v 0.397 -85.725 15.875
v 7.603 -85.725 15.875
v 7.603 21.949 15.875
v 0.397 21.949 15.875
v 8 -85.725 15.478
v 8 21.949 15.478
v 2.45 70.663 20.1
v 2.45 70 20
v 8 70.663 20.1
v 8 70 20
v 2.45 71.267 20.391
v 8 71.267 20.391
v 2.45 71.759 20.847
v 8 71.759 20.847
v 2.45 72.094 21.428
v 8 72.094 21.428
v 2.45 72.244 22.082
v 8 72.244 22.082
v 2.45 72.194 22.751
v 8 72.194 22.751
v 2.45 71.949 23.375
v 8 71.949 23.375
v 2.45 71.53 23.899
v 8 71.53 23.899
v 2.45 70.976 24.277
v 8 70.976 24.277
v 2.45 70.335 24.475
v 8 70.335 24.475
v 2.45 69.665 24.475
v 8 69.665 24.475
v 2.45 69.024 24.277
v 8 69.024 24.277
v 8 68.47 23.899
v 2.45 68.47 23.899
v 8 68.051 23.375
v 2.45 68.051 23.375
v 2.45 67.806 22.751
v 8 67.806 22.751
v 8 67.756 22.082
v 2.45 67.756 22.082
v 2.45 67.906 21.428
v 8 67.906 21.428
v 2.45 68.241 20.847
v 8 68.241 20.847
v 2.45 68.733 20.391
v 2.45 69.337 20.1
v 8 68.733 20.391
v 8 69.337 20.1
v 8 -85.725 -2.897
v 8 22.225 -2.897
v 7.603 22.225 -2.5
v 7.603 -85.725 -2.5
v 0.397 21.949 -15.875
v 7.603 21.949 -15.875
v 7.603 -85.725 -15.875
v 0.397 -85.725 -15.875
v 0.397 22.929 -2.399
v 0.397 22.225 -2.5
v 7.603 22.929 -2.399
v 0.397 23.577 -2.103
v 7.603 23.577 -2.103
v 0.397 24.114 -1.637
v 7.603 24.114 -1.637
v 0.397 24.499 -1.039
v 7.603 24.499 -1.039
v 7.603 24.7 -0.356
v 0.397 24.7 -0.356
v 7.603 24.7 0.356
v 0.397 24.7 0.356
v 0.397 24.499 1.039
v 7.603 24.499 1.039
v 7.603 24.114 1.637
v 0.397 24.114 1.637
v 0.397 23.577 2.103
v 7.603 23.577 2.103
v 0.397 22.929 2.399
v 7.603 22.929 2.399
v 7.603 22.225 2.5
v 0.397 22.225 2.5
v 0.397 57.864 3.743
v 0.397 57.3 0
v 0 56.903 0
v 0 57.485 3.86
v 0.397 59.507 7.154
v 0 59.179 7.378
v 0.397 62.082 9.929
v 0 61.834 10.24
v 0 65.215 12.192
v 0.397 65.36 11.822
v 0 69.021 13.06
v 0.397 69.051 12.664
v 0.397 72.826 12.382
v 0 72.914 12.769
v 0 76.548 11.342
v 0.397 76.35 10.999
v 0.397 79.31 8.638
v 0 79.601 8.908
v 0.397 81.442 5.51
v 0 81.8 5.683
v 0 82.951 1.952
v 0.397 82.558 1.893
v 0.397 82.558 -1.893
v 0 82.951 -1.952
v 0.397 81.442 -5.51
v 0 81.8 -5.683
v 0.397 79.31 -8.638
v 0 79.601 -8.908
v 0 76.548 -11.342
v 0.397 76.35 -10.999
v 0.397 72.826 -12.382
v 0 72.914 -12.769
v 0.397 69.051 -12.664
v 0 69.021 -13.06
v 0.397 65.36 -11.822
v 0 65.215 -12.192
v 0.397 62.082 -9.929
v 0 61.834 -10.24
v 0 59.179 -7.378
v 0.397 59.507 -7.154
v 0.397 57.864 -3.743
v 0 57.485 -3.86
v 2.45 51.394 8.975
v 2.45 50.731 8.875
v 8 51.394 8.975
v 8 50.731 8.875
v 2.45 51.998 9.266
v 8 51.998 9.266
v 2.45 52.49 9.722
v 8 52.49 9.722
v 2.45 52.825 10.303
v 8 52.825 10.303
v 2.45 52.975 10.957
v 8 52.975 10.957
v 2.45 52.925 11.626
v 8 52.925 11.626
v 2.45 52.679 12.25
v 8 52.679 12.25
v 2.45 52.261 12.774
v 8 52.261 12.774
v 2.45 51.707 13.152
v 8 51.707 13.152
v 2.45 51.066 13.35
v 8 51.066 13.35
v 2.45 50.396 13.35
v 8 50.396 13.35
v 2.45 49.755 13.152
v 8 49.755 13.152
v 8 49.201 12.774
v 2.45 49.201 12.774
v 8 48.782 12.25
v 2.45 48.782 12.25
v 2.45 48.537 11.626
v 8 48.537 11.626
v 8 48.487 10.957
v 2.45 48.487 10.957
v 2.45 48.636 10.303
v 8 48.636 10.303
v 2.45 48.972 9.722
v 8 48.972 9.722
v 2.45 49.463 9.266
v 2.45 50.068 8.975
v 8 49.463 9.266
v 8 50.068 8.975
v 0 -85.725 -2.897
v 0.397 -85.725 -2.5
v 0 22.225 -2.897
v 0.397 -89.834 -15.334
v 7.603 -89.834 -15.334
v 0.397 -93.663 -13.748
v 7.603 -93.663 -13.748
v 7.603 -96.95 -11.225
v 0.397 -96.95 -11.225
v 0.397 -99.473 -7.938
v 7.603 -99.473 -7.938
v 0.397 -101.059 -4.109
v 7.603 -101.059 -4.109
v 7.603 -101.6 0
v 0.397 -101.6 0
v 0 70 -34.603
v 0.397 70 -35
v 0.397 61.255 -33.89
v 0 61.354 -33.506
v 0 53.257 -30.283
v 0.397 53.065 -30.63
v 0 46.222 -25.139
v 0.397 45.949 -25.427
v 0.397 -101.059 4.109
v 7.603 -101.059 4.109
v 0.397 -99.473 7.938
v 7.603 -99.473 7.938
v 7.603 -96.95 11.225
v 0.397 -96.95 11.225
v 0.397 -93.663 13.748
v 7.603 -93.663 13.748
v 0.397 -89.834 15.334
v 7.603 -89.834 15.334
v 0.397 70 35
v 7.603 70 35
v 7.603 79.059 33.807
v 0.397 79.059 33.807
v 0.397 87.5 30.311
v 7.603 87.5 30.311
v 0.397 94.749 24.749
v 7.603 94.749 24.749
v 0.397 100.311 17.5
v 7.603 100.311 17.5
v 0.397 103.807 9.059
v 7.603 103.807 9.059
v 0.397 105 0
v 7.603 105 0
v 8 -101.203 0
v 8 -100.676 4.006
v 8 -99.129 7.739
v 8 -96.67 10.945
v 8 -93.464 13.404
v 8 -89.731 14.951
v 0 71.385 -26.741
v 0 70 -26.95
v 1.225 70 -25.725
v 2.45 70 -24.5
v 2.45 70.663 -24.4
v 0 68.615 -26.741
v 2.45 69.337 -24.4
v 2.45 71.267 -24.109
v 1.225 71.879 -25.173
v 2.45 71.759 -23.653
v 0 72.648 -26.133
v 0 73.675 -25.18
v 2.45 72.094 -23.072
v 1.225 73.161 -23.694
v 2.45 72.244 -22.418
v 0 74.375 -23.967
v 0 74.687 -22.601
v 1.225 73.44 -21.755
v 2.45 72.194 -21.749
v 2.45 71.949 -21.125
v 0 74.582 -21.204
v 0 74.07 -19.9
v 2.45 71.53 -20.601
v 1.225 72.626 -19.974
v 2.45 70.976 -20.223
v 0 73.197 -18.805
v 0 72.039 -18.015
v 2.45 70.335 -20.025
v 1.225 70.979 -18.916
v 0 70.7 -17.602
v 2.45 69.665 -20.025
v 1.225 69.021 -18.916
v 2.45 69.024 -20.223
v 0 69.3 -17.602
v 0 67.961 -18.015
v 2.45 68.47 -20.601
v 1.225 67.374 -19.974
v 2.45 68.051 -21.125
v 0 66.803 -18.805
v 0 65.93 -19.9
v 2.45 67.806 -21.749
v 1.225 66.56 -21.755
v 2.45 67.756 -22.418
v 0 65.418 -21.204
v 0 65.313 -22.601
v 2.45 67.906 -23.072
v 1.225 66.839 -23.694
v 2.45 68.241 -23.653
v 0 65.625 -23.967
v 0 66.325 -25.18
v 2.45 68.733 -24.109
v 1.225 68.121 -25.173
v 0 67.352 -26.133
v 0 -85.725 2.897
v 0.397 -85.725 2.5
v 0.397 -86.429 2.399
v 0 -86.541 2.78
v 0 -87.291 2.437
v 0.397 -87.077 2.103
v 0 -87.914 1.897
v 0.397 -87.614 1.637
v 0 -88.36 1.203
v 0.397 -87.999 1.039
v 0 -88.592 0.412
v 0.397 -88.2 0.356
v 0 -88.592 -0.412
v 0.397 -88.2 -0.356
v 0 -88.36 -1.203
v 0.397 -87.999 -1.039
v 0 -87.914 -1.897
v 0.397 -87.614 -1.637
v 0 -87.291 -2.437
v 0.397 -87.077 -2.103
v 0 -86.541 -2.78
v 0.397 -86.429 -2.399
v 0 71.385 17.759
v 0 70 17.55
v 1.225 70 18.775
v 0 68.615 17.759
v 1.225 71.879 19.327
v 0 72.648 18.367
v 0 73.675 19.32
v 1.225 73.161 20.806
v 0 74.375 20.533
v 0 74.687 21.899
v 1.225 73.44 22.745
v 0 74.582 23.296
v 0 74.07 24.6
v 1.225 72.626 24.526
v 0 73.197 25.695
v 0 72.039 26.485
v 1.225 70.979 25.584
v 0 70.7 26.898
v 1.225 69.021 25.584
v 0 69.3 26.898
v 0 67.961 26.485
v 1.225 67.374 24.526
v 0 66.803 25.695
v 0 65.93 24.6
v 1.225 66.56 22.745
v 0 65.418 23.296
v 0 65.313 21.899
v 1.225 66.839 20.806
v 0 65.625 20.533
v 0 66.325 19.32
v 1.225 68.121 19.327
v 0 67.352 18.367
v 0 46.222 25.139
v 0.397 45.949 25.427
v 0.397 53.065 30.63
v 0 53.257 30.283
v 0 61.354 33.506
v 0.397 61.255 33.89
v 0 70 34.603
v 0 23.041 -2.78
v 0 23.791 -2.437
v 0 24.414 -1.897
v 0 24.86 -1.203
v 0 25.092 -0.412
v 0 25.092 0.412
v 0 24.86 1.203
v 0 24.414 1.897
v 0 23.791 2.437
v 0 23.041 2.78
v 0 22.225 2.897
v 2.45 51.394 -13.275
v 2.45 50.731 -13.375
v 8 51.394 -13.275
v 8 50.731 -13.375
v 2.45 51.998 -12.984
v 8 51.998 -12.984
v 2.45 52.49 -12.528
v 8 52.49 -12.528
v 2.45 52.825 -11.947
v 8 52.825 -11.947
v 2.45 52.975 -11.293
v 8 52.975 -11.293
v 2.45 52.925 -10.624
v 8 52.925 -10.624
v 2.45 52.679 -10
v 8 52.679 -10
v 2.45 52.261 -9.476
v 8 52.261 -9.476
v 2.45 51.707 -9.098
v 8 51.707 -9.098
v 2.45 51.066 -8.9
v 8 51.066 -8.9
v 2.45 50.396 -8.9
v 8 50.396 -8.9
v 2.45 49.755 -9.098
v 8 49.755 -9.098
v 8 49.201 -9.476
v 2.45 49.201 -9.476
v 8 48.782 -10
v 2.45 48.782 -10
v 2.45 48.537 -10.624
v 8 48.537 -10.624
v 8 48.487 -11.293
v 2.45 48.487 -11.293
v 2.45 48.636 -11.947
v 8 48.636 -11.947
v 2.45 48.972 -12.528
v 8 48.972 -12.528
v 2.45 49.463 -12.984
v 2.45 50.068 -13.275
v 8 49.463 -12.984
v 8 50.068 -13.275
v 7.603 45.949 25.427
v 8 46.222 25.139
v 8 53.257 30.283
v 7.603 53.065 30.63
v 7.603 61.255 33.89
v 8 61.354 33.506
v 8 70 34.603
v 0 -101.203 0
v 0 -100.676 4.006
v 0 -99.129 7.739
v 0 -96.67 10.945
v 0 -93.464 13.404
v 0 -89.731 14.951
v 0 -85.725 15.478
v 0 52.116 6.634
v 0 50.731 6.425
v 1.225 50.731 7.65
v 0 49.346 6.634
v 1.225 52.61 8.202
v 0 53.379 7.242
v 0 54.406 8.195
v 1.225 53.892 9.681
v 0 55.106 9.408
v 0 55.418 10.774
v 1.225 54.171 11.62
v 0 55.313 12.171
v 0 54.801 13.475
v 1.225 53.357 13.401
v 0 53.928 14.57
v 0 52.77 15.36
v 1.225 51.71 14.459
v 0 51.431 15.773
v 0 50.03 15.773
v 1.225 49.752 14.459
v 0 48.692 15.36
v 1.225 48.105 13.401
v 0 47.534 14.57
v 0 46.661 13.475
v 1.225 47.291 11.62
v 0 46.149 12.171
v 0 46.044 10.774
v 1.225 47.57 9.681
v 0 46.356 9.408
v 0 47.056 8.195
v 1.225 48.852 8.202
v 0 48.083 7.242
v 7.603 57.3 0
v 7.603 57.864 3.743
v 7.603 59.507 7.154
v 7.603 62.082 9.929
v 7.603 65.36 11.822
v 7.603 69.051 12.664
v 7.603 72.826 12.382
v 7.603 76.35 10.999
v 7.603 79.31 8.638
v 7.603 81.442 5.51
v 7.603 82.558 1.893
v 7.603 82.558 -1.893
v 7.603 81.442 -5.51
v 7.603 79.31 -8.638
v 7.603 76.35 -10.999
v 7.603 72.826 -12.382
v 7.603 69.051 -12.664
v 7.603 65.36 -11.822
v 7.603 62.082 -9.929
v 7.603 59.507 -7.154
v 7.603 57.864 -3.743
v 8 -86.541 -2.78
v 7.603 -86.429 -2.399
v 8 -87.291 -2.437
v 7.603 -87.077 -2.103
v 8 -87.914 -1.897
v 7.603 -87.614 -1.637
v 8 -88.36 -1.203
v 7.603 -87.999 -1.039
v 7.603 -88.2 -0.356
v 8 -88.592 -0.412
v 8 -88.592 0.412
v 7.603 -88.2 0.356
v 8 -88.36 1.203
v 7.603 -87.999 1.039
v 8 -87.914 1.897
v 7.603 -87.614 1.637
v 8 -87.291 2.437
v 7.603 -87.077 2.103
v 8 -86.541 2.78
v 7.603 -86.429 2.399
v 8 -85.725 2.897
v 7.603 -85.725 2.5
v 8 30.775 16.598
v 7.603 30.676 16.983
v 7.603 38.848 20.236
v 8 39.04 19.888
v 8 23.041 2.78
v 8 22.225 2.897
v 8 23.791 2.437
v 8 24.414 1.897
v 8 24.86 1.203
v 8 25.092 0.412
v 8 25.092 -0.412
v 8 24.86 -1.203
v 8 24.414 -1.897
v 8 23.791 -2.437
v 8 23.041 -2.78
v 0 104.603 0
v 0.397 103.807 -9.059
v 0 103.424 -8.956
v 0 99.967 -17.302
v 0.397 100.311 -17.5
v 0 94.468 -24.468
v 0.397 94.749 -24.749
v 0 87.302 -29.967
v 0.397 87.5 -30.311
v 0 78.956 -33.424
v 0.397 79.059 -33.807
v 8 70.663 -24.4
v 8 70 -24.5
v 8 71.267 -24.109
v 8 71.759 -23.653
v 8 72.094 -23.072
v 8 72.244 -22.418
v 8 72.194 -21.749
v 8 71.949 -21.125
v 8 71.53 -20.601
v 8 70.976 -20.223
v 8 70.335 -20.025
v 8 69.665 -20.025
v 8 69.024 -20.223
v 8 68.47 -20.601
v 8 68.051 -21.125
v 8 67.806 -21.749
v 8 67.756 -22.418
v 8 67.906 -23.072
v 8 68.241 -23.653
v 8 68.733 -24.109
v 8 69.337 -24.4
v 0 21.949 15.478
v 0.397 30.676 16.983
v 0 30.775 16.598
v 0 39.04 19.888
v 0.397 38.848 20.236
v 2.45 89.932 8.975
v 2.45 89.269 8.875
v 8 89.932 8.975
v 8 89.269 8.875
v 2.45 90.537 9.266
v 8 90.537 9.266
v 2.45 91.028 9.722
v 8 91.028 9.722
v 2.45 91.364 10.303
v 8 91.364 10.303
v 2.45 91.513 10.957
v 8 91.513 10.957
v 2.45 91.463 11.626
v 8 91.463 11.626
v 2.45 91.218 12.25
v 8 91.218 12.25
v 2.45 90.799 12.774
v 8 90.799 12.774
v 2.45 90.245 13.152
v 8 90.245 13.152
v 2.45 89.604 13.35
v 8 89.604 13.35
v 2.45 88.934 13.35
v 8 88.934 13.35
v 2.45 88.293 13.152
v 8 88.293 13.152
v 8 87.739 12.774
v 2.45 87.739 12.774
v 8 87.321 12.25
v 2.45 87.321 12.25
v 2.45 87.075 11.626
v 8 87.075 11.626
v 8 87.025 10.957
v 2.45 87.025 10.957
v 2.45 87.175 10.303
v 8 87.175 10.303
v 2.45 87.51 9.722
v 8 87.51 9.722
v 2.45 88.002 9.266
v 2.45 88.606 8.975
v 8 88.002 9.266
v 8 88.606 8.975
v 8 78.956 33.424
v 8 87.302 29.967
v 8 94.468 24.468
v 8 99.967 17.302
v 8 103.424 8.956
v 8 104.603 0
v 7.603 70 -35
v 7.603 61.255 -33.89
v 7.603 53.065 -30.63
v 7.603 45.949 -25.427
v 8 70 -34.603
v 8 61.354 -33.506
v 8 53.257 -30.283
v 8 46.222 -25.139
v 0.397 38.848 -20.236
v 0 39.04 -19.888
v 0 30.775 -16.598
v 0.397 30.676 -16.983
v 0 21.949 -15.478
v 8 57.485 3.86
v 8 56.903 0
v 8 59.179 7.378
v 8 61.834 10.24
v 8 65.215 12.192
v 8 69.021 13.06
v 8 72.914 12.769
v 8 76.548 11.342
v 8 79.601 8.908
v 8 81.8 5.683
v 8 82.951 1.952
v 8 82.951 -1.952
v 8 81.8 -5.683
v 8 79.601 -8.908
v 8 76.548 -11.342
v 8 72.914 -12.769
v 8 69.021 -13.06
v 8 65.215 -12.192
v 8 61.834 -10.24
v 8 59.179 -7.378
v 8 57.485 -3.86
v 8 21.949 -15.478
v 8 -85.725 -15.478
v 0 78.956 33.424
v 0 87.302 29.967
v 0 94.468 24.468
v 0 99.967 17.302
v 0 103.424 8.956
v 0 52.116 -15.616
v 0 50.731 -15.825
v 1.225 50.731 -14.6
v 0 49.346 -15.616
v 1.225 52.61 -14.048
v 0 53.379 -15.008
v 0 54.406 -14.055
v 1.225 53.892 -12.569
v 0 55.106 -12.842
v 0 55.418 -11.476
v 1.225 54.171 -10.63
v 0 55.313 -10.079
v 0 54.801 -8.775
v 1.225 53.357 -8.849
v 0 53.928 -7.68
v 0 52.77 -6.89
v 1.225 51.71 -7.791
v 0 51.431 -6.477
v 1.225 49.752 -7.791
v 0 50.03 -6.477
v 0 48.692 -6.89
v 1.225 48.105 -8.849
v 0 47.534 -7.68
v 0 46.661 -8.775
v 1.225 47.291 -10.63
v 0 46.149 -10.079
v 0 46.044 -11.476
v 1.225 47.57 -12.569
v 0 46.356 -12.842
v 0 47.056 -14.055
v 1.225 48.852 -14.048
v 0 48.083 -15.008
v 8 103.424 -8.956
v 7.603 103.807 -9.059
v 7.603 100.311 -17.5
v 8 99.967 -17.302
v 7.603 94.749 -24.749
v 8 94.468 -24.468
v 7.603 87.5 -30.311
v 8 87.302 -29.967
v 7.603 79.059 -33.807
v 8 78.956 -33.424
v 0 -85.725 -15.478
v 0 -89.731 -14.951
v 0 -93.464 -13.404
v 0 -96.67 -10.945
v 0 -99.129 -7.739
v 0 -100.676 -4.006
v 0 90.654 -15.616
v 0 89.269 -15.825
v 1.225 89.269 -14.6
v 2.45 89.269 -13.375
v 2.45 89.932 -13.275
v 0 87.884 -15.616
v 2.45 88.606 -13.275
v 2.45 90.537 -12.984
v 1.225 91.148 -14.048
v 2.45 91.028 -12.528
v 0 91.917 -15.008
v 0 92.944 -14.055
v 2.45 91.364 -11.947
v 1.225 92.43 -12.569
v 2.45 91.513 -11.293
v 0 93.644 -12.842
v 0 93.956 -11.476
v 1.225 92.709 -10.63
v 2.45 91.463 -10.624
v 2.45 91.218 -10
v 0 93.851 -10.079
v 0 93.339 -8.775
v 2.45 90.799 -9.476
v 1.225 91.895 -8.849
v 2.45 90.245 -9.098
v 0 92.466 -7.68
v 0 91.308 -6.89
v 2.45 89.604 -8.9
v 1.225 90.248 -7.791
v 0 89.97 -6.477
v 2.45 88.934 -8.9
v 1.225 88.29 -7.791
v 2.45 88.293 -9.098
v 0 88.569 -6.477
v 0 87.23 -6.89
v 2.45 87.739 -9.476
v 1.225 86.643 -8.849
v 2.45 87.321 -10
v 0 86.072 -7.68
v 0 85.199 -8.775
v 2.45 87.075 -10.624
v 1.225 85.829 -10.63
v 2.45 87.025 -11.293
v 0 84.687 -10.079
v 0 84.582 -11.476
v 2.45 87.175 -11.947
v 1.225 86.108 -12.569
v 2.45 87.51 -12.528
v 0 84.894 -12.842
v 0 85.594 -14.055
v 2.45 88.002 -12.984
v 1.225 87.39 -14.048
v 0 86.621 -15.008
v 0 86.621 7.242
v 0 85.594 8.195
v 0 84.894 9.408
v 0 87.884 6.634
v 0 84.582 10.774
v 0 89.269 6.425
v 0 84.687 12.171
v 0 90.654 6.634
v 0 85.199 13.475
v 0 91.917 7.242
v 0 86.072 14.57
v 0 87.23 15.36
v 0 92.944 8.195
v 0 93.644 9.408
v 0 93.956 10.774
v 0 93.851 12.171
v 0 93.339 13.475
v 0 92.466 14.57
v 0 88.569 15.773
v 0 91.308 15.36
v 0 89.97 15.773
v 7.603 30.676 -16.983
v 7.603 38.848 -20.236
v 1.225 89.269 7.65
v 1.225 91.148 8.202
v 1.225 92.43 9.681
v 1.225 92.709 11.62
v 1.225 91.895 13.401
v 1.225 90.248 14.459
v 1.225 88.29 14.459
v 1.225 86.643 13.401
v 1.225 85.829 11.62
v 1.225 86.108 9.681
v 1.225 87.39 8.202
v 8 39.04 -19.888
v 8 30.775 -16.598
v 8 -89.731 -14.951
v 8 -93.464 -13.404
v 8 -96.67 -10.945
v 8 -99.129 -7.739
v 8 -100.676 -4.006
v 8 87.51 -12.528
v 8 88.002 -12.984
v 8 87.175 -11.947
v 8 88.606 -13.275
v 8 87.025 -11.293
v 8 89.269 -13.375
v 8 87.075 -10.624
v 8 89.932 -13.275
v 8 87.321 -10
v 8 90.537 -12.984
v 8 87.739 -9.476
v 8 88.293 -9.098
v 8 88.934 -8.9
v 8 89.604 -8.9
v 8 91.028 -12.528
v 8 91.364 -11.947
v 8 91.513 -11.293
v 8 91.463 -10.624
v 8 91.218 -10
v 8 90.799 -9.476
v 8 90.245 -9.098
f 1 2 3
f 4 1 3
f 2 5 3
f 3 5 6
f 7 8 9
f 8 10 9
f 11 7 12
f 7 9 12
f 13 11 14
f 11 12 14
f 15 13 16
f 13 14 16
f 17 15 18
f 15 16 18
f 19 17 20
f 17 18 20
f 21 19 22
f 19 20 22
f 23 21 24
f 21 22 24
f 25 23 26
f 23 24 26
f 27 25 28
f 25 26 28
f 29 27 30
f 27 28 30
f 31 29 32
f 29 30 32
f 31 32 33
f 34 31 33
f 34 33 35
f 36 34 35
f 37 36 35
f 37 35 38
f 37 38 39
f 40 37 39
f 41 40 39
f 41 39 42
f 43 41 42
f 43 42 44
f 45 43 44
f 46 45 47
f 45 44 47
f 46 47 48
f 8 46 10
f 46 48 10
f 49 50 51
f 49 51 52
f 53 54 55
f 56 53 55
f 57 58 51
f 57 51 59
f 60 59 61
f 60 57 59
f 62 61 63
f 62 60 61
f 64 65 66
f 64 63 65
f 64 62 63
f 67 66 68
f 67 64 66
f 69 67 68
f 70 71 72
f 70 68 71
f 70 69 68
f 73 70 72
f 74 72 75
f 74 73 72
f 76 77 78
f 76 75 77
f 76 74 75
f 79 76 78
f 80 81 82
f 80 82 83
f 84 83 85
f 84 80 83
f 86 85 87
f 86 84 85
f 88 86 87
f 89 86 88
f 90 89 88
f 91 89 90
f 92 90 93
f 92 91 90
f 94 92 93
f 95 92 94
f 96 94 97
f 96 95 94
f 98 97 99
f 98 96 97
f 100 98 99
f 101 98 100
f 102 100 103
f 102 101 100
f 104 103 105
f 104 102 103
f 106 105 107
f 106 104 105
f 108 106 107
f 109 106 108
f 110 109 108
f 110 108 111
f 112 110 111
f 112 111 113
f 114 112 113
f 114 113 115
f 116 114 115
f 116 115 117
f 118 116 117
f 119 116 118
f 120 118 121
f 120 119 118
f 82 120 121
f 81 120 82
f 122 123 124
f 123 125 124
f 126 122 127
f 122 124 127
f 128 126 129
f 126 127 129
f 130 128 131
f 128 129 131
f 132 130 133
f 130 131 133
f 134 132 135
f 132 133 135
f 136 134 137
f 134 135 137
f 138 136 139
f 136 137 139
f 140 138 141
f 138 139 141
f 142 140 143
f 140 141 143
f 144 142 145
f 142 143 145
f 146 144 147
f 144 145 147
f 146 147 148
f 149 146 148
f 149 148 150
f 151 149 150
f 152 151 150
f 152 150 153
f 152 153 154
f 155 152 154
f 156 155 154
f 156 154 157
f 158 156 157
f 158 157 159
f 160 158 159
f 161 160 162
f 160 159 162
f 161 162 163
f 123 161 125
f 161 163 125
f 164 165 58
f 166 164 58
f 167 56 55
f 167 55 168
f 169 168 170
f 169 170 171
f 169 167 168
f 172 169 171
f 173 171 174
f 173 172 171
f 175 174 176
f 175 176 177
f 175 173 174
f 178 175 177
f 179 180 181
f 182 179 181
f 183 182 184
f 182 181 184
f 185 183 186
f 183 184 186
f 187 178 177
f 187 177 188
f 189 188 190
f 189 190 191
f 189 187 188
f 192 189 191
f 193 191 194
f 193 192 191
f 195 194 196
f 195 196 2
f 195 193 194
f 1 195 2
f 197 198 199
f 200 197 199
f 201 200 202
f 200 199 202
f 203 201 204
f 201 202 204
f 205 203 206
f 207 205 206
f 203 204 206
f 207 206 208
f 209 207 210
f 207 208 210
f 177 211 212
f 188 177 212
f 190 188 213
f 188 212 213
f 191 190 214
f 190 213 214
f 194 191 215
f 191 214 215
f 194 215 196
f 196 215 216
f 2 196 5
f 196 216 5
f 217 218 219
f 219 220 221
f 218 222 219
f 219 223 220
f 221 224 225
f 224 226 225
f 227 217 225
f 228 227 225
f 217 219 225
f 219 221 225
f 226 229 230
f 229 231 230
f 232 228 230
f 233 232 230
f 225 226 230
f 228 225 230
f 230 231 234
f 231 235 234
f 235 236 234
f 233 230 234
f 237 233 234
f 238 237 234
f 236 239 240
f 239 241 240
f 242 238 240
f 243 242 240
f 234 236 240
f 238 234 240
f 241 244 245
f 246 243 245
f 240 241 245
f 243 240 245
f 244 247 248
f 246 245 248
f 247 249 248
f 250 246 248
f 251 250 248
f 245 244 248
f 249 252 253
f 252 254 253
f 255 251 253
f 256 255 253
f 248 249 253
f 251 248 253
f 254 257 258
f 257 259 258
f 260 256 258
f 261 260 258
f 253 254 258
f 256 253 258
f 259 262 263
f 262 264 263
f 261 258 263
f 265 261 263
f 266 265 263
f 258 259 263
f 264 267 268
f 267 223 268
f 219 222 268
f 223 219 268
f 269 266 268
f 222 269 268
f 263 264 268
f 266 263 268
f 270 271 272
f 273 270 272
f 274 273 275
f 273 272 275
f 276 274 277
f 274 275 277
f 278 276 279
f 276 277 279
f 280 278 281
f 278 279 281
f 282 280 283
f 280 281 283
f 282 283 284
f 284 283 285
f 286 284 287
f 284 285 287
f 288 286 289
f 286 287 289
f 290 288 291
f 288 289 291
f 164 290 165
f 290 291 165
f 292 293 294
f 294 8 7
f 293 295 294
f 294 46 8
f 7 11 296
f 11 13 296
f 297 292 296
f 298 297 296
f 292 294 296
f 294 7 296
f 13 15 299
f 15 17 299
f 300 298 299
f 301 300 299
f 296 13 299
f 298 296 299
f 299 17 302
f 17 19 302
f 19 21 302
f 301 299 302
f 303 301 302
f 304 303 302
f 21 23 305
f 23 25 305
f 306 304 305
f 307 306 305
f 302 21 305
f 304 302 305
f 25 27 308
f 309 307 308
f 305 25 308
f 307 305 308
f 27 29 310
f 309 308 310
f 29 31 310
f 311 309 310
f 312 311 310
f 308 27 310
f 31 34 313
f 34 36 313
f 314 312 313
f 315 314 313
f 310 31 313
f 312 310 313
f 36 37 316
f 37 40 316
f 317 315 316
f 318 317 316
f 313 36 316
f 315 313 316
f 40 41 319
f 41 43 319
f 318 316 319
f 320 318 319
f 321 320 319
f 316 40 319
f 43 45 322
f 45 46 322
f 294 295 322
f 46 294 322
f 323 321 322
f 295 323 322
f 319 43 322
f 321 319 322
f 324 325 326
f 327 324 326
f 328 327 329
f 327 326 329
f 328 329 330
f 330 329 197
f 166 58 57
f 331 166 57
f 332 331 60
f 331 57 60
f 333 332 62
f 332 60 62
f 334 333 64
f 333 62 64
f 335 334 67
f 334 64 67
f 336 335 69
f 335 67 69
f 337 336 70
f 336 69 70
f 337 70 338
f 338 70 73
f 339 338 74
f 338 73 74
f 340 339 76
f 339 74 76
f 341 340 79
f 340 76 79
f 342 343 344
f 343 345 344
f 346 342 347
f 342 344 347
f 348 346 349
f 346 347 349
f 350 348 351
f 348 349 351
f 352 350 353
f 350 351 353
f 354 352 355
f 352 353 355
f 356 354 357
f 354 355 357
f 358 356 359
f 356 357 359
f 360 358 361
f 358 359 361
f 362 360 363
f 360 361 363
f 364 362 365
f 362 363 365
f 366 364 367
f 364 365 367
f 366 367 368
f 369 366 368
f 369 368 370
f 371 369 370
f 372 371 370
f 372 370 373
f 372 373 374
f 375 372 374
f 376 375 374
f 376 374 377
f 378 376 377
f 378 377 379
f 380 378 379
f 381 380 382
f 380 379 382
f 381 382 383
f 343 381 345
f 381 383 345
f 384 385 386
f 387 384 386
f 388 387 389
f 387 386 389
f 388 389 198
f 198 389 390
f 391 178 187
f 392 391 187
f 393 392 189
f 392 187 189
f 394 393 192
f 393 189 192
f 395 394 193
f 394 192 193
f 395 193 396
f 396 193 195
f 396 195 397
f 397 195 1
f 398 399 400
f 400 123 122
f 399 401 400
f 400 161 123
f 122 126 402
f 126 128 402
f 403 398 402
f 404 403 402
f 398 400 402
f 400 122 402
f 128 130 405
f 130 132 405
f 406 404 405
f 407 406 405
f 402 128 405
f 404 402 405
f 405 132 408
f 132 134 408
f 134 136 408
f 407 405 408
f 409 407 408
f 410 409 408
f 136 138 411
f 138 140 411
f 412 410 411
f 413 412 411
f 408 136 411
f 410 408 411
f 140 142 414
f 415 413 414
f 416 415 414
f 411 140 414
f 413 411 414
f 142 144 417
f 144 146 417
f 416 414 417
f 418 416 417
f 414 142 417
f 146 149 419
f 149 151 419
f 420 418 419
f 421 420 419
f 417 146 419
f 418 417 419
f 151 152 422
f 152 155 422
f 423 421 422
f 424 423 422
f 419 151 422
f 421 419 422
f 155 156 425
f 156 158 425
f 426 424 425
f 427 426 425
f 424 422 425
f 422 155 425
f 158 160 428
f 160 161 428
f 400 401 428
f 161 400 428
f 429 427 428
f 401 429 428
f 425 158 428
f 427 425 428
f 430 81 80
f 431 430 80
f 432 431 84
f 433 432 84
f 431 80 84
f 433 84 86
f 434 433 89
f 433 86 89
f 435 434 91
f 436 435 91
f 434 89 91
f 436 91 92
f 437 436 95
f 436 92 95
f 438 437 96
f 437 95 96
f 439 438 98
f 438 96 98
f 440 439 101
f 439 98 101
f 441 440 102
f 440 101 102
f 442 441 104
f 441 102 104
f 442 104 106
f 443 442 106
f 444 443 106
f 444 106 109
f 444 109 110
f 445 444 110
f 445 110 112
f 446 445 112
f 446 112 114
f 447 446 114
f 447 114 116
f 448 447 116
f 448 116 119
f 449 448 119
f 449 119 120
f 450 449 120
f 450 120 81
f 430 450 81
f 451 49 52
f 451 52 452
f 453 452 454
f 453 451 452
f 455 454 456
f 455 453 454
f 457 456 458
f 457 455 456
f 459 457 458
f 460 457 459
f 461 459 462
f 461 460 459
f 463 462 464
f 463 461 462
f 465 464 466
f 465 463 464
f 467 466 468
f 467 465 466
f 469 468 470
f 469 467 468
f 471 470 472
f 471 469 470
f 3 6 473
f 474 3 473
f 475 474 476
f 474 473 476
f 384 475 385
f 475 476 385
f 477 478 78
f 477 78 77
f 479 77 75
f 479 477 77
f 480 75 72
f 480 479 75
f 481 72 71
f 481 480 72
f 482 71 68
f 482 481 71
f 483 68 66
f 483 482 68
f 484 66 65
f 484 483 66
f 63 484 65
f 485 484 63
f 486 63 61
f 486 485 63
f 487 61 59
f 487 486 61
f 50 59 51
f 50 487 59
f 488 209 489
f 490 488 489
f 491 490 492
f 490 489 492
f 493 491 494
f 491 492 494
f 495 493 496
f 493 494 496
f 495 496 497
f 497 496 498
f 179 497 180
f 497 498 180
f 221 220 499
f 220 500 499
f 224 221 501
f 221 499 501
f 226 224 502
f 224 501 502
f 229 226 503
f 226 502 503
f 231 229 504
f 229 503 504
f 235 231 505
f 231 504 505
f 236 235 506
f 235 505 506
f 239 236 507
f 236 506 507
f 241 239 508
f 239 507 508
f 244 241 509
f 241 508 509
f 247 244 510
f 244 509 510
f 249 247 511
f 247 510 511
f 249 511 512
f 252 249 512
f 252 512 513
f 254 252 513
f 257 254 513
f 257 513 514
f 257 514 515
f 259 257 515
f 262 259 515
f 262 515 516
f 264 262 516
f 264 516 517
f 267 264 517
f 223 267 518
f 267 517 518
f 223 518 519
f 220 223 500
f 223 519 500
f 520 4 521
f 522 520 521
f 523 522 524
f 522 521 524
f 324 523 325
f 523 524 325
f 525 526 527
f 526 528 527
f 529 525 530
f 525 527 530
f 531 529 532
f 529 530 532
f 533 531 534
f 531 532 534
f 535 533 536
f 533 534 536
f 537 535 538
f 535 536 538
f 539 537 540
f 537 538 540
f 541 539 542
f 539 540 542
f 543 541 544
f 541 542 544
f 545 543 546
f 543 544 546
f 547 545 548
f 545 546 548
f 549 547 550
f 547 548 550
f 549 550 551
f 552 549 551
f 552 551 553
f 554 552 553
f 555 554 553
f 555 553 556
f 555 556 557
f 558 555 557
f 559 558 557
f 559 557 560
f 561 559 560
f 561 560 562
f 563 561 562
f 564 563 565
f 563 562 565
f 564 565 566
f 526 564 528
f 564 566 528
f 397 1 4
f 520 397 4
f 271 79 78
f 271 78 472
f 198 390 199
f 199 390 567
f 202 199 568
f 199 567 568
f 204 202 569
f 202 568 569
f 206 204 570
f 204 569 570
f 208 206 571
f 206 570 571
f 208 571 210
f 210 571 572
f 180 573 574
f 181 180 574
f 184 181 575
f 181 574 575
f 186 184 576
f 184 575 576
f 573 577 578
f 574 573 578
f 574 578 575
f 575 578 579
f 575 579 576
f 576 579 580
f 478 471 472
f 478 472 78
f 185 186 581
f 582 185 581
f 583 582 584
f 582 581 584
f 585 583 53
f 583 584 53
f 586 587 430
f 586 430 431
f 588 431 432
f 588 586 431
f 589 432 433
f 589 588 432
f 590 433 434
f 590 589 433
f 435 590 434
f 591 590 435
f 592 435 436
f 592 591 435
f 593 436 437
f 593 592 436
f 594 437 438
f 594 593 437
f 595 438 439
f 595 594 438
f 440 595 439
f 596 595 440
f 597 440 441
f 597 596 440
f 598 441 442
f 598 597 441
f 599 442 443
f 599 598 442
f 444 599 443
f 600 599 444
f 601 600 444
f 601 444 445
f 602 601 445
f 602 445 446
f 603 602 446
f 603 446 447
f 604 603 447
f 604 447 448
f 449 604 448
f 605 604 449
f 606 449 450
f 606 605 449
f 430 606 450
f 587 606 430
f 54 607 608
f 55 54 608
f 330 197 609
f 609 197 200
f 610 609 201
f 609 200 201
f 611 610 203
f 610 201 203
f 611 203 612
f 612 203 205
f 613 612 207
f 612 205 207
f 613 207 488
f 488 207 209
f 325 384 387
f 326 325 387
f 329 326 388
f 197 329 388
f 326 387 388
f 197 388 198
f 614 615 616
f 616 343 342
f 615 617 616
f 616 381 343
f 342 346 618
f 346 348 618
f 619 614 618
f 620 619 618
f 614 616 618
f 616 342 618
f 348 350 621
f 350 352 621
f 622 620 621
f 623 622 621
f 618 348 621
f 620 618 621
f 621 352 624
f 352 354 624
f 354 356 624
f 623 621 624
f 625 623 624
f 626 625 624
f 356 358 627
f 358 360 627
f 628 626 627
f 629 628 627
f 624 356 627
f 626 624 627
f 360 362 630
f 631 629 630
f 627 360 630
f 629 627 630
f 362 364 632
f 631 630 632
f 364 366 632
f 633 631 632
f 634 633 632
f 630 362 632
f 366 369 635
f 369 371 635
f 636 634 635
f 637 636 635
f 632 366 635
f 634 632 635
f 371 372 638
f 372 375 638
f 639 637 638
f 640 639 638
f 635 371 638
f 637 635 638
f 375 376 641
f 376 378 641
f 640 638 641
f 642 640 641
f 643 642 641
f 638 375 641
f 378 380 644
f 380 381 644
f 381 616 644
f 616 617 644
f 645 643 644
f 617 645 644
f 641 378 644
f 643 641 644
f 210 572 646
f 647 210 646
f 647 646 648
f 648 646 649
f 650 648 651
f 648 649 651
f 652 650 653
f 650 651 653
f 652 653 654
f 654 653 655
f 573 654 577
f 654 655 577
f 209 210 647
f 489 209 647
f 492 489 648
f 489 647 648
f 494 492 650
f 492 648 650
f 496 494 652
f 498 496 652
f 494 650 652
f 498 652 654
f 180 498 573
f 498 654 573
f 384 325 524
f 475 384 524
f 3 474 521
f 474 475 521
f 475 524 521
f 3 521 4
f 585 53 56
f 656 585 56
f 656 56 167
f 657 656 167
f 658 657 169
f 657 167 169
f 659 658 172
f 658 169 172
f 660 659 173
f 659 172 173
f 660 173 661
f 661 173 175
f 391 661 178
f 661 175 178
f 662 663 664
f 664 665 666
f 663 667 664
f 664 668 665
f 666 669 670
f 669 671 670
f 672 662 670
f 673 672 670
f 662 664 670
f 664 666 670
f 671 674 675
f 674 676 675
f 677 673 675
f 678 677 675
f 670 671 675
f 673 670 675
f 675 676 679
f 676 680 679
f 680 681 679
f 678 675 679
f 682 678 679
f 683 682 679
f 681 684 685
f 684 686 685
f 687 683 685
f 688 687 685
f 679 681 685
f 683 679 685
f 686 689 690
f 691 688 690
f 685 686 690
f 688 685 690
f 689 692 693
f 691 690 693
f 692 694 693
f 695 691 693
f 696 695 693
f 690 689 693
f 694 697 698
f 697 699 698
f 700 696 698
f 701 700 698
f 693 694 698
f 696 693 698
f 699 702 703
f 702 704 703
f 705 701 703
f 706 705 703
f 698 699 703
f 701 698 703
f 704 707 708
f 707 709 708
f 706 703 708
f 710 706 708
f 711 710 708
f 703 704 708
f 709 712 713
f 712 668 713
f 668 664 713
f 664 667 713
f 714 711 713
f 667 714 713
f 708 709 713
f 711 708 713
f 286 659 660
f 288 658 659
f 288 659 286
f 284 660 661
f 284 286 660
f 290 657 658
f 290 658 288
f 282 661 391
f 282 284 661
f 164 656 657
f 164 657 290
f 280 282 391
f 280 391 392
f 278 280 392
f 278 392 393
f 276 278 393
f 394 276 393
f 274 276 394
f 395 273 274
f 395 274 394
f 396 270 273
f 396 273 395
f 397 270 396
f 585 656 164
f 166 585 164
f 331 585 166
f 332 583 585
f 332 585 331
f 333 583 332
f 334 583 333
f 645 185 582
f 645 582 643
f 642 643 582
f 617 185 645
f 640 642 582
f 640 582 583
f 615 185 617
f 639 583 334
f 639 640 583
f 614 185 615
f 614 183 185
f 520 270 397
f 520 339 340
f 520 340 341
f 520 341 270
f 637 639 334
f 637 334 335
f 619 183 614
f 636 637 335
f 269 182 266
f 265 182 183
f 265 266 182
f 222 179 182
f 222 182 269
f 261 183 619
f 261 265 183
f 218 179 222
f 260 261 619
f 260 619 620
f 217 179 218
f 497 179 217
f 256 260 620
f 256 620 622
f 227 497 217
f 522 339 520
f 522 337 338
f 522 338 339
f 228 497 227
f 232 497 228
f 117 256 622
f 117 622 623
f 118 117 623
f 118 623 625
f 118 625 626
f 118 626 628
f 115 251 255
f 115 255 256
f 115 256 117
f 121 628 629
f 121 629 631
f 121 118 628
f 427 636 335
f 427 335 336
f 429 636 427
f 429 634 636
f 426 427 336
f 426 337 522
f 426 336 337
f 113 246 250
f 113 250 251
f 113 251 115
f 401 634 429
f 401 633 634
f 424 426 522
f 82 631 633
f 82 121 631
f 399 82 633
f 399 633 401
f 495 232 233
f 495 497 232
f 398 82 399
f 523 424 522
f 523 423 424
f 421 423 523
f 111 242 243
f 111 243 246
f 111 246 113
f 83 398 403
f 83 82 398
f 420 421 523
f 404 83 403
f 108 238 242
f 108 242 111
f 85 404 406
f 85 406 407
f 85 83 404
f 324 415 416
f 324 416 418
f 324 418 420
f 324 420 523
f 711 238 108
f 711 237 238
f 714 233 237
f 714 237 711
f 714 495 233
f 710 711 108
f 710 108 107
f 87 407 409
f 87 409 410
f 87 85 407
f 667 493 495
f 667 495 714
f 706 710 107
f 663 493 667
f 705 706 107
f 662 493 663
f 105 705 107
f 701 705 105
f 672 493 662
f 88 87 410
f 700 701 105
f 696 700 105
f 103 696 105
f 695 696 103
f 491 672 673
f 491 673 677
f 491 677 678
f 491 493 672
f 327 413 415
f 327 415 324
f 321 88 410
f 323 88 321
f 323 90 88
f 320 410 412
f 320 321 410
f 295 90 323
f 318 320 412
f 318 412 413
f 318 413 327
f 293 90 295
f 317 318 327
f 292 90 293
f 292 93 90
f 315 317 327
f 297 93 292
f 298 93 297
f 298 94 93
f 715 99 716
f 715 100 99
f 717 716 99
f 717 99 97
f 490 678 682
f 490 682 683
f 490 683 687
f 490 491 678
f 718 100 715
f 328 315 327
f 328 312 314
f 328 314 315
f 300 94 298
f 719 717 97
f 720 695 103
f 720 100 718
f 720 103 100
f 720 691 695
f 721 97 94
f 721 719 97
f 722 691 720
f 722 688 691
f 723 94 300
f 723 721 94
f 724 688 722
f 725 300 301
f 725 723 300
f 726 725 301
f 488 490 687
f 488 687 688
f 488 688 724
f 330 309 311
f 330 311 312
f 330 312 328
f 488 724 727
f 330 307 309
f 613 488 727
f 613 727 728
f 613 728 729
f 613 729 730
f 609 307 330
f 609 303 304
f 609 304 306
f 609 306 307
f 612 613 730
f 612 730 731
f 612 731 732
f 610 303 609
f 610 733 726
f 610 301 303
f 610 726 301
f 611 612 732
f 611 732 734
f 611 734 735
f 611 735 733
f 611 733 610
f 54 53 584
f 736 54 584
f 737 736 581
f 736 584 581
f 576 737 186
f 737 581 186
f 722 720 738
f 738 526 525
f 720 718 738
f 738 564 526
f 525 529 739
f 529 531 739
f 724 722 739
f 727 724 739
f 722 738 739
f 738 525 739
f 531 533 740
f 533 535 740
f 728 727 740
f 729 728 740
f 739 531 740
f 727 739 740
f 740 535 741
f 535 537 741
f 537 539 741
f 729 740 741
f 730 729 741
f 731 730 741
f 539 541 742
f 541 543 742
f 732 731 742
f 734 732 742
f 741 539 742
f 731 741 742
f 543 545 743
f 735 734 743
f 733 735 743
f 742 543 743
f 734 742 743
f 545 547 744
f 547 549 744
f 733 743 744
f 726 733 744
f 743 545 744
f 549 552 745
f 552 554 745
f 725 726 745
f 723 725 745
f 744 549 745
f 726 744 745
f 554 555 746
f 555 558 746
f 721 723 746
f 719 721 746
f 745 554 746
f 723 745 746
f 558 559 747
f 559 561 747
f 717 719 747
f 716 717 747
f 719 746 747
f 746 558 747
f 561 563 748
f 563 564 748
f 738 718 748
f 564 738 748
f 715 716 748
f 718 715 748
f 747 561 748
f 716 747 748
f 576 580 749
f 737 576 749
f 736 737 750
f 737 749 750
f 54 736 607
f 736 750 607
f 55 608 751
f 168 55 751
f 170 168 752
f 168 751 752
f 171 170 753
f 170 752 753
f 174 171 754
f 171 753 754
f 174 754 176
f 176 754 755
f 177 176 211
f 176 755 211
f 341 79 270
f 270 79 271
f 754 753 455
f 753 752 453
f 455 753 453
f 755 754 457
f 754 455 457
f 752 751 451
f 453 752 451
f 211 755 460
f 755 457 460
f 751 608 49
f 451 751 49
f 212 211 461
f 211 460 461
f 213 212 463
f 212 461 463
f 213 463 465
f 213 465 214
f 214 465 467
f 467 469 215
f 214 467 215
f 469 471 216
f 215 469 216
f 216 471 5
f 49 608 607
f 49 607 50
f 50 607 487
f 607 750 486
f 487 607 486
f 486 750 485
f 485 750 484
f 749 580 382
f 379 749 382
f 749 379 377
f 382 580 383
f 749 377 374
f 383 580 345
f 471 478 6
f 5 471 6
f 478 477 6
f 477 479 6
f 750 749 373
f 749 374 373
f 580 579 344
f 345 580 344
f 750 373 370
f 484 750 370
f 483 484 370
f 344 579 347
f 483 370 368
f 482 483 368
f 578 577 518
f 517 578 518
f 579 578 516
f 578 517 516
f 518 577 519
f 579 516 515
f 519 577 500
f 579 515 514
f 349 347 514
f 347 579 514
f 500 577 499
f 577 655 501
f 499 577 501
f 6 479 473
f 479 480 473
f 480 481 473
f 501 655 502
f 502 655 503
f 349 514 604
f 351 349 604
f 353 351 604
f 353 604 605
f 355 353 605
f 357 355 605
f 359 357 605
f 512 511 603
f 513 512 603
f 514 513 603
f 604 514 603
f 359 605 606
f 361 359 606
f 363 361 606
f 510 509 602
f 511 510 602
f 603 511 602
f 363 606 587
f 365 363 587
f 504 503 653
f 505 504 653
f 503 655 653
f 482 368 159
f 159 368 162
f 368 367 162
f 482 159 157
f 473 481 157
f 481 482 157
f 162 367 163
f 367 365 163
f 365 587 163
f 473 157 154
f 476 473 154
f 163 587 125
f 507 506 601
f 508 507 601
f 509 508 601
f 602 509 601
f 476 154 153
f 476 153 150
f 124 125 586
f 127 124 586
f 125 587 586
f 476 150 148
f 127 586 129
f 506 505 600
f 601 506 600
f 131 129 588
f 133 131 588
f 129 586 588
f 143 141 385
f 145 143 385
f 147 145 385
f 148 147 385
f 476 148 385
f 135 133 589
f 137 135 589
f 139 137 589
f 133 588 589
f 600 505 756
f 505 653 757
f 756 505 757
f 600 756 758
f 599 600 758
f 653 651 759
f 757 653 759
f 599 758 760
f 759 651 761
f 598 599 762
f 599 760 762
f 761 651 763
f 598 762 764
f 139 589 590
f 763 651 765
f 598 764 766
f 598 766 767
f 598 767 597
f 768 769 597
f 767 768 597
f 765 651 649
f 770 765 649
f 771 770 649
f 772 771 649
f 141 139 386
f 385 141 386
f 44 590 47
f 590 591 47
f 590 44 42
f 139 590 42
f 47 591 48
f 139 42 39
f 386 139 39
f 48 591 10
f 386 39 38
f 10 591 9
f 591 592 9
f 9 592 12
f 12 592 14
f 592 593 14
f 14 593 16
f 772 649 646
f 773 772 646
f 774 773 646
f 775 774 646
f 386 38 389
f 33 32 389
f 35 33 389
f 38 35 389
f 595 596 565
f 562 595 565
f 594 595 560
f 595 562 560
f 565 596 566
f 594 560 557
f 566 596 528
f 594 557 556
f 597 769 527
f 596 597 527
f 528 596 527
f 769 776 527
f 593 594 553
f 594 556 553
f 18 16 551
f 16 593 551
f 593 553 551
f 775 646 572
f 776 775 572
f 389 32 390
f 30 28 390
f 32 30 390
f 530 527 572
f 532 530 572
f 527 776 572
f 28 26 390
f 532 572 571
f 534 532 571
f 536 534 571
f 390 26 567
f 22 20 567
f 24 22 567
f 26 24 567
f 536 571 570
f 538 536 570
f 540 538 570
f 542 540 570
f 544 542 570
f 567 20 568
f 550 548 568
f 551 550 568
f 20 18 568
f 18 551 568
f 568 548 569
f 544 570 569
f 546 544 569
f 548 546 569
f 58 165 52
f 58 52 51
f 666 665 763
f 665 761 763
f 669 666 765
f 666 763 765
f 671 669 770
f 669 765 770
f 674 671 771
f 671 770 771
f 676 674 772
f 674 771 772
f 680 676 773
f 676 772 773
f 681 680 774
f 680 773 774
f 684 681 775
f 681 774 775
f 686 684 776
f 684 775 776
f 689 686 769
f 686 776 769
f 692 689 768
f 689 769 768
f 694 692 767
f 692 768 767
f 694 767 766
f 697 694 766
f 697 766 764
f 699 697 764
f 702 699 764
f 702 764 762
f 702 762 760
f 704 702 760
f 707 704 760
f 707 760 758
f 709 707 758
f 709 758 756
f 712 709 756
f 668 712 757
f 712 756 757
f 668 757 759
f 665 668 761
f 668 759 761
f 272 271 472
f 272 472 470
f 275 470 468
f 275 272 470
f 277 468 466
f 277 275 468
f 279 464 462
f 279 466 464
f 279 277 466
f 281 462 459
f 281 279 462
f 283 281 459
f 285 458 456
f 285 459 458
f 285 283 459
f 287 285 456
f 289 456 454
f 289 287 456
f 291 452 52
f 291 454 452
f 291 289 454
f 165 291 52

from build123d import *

# Parameters (mm, degrees)
SKETCH1_W                                           = 8
SKETCH1_H                                           = 105
BASE_DEPTH                                          = 35
CSK_FOR_M4_COUNTERSUNK_FLAT_HEAD_SCREW2_D           = 4.5
CSK_FOR_M4_COUNTERSUNK_FLAT_HEAD_SCREW2_CSINK_D     = 9.4
CSK_FOR_M4_COUNTERSUNK_FLAT_HEAD_SCREW2_CSINK_ANGLE = 90
FILLET1_R                                           = 35
SKETCH8_W                                           = 8
SKETCH8_H                                           = 70
BOSS_EXTRUDE1_DEPTH                                 = 101.6
CUT_EXTRUDE1_REACH                                  = 112.968
CUT_EXTRUDE2_DEPTH                                  = 111.968463989
FILLET2_R                                           = 34.925
FILLET3_R                                           = 15.875
SKETCH12_R                                          = 12.7
CUT_EXTRUDE4_DEPTH                                  = 111.968463989
CHAMFER1_SIZE                                       = 0.396875


with BuildPart() as part:
    # Sketch1 → base (new, symmetric)
    with BuildSketch(Plane.XY):
        with Locations((4, 52.5)):
            Rectangle(SKETCH1_W, SKETCH1_H)
    extrude(amount=BASE_DEPTH, both=True)

    # CSK for M4 Countersunk Flat Head Screw2 (through all)
    with Locations(Plane.ZY):
        with Locations((-11.125, 50.730934766), (-22.25, 70), (-11.125, 89.269065234), (11.125, 89.269065234), (22.25, 70), (11.125, 50.730934766)):
            CounterSinkHole(CSK_FOR_M4_COUNTERSUNK_FLAT_HEAD_SCREW2_D / 2, CSK_FOR_M4_COUNTERSUNK_FLAT_HEAD_SCREW2_CSINK_D / 2, counter_sink_angle=CSK_FOR_M4_COUNTERSUNK_FLAT_HEAD_SCREW2_CSINK_ANGLE)

    # Fillet1
    fillet1_edges = [part.edges().sort_by_distance(p)[0] for p in [
        (4, 105, 35),
        (4, 105, -35),
    ]]
    fillet(fillet1_edges, radius=FILLET1_R - 0.0001)  # a hair under: the kernel refuses the full size

    # Sketch8 → Boss-Extrude1 (add)
    with BuildSketch(Plane.XZ):
        with Locations((4, 0)):
            Rectangle(SKETCH8_W, SKETCH8_H)
    extrude(amount=BOSS_EXTRUDE1_DEPTH)

    # Sketch9 → Cut-Extrude1 (cut, up to next)
    with BuildSketch(Plane.ZY, mode=Mode.PRIVATE) as cut_extrude1_sk1:
        with BuildLine():
            Line((2.5, 22.225), (2.5, -85.725))
            ThreePointArc((2.5, -85.725), (0, -88.225), (-2.5, -85.725))
            Line((-2.5, -85.725), (-2.5, 22.225))
            ThreePointArc((-2.5, 22.225), (0, 24.725), (2.5, 22.225))
        make_face()
    cut_extrude1_tool1 = extrude(cut_extrude1_sk1.sketch, amount=-CUT_EXTRUDE1_REACH, mode=Mode.PRIVATE) & part.part
    add(cut_extrude1_tool1.solids().sort_by_distance((0, -31.75, 0))[0], mode=Mode.SUBTRACT)

    # Sketch10 → Cut-Extrude2 (cut, through all)
    with BuildSketch(Plane(origin=(8, 0, 0), x_dir=(0, 0, -1), z_dir=(1, 0, 0))):
        with BuildLine():
            Line((15.875, 38.807302537), (15.875, -101.6))
            Line((15.875, -101.6), (35, -101.6))
            Line((35, -101.6), (35, 70))
            ThreePointArc((35, 70), (29.838104833, 51.705533624), (15.875, 38.807302537))
        make_face()
        with BuildLine():
            Line((-35, -101.6), (-15.875, -101.6))
            Line((-15.875, -101.6), (-15.875, 38.807302537))
            ThreePointArc((-15.875, 38.807302537), (-29.838104833, 51.705533624), (-35, 70))
            Line((-35, 70), (-35, -101.6))
        make_face()
    extrude(amount=-CUT_EXTRUDE2_DEPTH, mode=Mode.SUBTRACT)

    # Fillet2
    fillet2_edges = [part.edges().sort_by_distance(p)[0] for p in [
        (4, 38.807302537, -15.875),
        (4, 38.807302537, 15.875),
    ]]
    fillet(fillet2_edges, radius=FILLET2_R)

    # Fillet3
    fillet3_edges = [part.edges().sort_by_distance(p)[0] for p in [
        (4, -101.6, -15.875),
        (4, -101.6, 15.875),
    ]]
    fillet(fillet3_edges, radius=FILLET3_R - 0.0001)  # a hair under: the kernel refuses the full size

    # Sketch12 → Cut-Extrude4 (cut, through all)
    with BuildSketch(Plane.ZY):
        with Locations(Location((0, 70, 0), (0, 0, 270))):
            Circle(SKETCH12_R)
    extrude(amount=-CUT_EXTRUDE4_DEPTH, mode=Mode.SUBTRACT)

    # Chamfer1
    chamfer1_edges = [part.edges().sort_by_distance(p)[0] for p in [
        (8, 94.748766631, -24.748766631),
        (0, 94.748766631, 24.748766631),
        (8, 34.864684854, -18.350815522),
        (0, 34.864684854, -18.350815522),
        (8, 34.864684854, 18.350815522),
        (0, 34.864684854, 18.350815522),
        (8, -31.887878432, -15.875),
        (8, -31.887878432, 15.875),
        (8, -96.950349441, 11.225349441),
        (8, -96.950349441, -11.225349441),
        (0, -31.887878432, -15.875),
        (0, -31.887878432, 15.875),
        (0, -96.950349441, 11.225349441),
        (0, -96.950349441, -11.225349441),
        (8, 82.7, 0),
        (0, 82.7, 0),
        (0, 94.748766631, -24.748766631),
        (8, 94.748766631, 24.748766631),
        (0, 24.725, 0),
        (0, -31.75, -2.5),
        (0, -88.225, 0),
        (0, -31.75, 2.5),
        (8, -31.75, -2.5),
        (8, 24.725, 0),
        (8, -31.75, 2.5),
        (8, -88.225, 0),
    ]]
    chamfer(chamfer1_edges, length=CHAMFER1_SIZE)


solid = part.part
